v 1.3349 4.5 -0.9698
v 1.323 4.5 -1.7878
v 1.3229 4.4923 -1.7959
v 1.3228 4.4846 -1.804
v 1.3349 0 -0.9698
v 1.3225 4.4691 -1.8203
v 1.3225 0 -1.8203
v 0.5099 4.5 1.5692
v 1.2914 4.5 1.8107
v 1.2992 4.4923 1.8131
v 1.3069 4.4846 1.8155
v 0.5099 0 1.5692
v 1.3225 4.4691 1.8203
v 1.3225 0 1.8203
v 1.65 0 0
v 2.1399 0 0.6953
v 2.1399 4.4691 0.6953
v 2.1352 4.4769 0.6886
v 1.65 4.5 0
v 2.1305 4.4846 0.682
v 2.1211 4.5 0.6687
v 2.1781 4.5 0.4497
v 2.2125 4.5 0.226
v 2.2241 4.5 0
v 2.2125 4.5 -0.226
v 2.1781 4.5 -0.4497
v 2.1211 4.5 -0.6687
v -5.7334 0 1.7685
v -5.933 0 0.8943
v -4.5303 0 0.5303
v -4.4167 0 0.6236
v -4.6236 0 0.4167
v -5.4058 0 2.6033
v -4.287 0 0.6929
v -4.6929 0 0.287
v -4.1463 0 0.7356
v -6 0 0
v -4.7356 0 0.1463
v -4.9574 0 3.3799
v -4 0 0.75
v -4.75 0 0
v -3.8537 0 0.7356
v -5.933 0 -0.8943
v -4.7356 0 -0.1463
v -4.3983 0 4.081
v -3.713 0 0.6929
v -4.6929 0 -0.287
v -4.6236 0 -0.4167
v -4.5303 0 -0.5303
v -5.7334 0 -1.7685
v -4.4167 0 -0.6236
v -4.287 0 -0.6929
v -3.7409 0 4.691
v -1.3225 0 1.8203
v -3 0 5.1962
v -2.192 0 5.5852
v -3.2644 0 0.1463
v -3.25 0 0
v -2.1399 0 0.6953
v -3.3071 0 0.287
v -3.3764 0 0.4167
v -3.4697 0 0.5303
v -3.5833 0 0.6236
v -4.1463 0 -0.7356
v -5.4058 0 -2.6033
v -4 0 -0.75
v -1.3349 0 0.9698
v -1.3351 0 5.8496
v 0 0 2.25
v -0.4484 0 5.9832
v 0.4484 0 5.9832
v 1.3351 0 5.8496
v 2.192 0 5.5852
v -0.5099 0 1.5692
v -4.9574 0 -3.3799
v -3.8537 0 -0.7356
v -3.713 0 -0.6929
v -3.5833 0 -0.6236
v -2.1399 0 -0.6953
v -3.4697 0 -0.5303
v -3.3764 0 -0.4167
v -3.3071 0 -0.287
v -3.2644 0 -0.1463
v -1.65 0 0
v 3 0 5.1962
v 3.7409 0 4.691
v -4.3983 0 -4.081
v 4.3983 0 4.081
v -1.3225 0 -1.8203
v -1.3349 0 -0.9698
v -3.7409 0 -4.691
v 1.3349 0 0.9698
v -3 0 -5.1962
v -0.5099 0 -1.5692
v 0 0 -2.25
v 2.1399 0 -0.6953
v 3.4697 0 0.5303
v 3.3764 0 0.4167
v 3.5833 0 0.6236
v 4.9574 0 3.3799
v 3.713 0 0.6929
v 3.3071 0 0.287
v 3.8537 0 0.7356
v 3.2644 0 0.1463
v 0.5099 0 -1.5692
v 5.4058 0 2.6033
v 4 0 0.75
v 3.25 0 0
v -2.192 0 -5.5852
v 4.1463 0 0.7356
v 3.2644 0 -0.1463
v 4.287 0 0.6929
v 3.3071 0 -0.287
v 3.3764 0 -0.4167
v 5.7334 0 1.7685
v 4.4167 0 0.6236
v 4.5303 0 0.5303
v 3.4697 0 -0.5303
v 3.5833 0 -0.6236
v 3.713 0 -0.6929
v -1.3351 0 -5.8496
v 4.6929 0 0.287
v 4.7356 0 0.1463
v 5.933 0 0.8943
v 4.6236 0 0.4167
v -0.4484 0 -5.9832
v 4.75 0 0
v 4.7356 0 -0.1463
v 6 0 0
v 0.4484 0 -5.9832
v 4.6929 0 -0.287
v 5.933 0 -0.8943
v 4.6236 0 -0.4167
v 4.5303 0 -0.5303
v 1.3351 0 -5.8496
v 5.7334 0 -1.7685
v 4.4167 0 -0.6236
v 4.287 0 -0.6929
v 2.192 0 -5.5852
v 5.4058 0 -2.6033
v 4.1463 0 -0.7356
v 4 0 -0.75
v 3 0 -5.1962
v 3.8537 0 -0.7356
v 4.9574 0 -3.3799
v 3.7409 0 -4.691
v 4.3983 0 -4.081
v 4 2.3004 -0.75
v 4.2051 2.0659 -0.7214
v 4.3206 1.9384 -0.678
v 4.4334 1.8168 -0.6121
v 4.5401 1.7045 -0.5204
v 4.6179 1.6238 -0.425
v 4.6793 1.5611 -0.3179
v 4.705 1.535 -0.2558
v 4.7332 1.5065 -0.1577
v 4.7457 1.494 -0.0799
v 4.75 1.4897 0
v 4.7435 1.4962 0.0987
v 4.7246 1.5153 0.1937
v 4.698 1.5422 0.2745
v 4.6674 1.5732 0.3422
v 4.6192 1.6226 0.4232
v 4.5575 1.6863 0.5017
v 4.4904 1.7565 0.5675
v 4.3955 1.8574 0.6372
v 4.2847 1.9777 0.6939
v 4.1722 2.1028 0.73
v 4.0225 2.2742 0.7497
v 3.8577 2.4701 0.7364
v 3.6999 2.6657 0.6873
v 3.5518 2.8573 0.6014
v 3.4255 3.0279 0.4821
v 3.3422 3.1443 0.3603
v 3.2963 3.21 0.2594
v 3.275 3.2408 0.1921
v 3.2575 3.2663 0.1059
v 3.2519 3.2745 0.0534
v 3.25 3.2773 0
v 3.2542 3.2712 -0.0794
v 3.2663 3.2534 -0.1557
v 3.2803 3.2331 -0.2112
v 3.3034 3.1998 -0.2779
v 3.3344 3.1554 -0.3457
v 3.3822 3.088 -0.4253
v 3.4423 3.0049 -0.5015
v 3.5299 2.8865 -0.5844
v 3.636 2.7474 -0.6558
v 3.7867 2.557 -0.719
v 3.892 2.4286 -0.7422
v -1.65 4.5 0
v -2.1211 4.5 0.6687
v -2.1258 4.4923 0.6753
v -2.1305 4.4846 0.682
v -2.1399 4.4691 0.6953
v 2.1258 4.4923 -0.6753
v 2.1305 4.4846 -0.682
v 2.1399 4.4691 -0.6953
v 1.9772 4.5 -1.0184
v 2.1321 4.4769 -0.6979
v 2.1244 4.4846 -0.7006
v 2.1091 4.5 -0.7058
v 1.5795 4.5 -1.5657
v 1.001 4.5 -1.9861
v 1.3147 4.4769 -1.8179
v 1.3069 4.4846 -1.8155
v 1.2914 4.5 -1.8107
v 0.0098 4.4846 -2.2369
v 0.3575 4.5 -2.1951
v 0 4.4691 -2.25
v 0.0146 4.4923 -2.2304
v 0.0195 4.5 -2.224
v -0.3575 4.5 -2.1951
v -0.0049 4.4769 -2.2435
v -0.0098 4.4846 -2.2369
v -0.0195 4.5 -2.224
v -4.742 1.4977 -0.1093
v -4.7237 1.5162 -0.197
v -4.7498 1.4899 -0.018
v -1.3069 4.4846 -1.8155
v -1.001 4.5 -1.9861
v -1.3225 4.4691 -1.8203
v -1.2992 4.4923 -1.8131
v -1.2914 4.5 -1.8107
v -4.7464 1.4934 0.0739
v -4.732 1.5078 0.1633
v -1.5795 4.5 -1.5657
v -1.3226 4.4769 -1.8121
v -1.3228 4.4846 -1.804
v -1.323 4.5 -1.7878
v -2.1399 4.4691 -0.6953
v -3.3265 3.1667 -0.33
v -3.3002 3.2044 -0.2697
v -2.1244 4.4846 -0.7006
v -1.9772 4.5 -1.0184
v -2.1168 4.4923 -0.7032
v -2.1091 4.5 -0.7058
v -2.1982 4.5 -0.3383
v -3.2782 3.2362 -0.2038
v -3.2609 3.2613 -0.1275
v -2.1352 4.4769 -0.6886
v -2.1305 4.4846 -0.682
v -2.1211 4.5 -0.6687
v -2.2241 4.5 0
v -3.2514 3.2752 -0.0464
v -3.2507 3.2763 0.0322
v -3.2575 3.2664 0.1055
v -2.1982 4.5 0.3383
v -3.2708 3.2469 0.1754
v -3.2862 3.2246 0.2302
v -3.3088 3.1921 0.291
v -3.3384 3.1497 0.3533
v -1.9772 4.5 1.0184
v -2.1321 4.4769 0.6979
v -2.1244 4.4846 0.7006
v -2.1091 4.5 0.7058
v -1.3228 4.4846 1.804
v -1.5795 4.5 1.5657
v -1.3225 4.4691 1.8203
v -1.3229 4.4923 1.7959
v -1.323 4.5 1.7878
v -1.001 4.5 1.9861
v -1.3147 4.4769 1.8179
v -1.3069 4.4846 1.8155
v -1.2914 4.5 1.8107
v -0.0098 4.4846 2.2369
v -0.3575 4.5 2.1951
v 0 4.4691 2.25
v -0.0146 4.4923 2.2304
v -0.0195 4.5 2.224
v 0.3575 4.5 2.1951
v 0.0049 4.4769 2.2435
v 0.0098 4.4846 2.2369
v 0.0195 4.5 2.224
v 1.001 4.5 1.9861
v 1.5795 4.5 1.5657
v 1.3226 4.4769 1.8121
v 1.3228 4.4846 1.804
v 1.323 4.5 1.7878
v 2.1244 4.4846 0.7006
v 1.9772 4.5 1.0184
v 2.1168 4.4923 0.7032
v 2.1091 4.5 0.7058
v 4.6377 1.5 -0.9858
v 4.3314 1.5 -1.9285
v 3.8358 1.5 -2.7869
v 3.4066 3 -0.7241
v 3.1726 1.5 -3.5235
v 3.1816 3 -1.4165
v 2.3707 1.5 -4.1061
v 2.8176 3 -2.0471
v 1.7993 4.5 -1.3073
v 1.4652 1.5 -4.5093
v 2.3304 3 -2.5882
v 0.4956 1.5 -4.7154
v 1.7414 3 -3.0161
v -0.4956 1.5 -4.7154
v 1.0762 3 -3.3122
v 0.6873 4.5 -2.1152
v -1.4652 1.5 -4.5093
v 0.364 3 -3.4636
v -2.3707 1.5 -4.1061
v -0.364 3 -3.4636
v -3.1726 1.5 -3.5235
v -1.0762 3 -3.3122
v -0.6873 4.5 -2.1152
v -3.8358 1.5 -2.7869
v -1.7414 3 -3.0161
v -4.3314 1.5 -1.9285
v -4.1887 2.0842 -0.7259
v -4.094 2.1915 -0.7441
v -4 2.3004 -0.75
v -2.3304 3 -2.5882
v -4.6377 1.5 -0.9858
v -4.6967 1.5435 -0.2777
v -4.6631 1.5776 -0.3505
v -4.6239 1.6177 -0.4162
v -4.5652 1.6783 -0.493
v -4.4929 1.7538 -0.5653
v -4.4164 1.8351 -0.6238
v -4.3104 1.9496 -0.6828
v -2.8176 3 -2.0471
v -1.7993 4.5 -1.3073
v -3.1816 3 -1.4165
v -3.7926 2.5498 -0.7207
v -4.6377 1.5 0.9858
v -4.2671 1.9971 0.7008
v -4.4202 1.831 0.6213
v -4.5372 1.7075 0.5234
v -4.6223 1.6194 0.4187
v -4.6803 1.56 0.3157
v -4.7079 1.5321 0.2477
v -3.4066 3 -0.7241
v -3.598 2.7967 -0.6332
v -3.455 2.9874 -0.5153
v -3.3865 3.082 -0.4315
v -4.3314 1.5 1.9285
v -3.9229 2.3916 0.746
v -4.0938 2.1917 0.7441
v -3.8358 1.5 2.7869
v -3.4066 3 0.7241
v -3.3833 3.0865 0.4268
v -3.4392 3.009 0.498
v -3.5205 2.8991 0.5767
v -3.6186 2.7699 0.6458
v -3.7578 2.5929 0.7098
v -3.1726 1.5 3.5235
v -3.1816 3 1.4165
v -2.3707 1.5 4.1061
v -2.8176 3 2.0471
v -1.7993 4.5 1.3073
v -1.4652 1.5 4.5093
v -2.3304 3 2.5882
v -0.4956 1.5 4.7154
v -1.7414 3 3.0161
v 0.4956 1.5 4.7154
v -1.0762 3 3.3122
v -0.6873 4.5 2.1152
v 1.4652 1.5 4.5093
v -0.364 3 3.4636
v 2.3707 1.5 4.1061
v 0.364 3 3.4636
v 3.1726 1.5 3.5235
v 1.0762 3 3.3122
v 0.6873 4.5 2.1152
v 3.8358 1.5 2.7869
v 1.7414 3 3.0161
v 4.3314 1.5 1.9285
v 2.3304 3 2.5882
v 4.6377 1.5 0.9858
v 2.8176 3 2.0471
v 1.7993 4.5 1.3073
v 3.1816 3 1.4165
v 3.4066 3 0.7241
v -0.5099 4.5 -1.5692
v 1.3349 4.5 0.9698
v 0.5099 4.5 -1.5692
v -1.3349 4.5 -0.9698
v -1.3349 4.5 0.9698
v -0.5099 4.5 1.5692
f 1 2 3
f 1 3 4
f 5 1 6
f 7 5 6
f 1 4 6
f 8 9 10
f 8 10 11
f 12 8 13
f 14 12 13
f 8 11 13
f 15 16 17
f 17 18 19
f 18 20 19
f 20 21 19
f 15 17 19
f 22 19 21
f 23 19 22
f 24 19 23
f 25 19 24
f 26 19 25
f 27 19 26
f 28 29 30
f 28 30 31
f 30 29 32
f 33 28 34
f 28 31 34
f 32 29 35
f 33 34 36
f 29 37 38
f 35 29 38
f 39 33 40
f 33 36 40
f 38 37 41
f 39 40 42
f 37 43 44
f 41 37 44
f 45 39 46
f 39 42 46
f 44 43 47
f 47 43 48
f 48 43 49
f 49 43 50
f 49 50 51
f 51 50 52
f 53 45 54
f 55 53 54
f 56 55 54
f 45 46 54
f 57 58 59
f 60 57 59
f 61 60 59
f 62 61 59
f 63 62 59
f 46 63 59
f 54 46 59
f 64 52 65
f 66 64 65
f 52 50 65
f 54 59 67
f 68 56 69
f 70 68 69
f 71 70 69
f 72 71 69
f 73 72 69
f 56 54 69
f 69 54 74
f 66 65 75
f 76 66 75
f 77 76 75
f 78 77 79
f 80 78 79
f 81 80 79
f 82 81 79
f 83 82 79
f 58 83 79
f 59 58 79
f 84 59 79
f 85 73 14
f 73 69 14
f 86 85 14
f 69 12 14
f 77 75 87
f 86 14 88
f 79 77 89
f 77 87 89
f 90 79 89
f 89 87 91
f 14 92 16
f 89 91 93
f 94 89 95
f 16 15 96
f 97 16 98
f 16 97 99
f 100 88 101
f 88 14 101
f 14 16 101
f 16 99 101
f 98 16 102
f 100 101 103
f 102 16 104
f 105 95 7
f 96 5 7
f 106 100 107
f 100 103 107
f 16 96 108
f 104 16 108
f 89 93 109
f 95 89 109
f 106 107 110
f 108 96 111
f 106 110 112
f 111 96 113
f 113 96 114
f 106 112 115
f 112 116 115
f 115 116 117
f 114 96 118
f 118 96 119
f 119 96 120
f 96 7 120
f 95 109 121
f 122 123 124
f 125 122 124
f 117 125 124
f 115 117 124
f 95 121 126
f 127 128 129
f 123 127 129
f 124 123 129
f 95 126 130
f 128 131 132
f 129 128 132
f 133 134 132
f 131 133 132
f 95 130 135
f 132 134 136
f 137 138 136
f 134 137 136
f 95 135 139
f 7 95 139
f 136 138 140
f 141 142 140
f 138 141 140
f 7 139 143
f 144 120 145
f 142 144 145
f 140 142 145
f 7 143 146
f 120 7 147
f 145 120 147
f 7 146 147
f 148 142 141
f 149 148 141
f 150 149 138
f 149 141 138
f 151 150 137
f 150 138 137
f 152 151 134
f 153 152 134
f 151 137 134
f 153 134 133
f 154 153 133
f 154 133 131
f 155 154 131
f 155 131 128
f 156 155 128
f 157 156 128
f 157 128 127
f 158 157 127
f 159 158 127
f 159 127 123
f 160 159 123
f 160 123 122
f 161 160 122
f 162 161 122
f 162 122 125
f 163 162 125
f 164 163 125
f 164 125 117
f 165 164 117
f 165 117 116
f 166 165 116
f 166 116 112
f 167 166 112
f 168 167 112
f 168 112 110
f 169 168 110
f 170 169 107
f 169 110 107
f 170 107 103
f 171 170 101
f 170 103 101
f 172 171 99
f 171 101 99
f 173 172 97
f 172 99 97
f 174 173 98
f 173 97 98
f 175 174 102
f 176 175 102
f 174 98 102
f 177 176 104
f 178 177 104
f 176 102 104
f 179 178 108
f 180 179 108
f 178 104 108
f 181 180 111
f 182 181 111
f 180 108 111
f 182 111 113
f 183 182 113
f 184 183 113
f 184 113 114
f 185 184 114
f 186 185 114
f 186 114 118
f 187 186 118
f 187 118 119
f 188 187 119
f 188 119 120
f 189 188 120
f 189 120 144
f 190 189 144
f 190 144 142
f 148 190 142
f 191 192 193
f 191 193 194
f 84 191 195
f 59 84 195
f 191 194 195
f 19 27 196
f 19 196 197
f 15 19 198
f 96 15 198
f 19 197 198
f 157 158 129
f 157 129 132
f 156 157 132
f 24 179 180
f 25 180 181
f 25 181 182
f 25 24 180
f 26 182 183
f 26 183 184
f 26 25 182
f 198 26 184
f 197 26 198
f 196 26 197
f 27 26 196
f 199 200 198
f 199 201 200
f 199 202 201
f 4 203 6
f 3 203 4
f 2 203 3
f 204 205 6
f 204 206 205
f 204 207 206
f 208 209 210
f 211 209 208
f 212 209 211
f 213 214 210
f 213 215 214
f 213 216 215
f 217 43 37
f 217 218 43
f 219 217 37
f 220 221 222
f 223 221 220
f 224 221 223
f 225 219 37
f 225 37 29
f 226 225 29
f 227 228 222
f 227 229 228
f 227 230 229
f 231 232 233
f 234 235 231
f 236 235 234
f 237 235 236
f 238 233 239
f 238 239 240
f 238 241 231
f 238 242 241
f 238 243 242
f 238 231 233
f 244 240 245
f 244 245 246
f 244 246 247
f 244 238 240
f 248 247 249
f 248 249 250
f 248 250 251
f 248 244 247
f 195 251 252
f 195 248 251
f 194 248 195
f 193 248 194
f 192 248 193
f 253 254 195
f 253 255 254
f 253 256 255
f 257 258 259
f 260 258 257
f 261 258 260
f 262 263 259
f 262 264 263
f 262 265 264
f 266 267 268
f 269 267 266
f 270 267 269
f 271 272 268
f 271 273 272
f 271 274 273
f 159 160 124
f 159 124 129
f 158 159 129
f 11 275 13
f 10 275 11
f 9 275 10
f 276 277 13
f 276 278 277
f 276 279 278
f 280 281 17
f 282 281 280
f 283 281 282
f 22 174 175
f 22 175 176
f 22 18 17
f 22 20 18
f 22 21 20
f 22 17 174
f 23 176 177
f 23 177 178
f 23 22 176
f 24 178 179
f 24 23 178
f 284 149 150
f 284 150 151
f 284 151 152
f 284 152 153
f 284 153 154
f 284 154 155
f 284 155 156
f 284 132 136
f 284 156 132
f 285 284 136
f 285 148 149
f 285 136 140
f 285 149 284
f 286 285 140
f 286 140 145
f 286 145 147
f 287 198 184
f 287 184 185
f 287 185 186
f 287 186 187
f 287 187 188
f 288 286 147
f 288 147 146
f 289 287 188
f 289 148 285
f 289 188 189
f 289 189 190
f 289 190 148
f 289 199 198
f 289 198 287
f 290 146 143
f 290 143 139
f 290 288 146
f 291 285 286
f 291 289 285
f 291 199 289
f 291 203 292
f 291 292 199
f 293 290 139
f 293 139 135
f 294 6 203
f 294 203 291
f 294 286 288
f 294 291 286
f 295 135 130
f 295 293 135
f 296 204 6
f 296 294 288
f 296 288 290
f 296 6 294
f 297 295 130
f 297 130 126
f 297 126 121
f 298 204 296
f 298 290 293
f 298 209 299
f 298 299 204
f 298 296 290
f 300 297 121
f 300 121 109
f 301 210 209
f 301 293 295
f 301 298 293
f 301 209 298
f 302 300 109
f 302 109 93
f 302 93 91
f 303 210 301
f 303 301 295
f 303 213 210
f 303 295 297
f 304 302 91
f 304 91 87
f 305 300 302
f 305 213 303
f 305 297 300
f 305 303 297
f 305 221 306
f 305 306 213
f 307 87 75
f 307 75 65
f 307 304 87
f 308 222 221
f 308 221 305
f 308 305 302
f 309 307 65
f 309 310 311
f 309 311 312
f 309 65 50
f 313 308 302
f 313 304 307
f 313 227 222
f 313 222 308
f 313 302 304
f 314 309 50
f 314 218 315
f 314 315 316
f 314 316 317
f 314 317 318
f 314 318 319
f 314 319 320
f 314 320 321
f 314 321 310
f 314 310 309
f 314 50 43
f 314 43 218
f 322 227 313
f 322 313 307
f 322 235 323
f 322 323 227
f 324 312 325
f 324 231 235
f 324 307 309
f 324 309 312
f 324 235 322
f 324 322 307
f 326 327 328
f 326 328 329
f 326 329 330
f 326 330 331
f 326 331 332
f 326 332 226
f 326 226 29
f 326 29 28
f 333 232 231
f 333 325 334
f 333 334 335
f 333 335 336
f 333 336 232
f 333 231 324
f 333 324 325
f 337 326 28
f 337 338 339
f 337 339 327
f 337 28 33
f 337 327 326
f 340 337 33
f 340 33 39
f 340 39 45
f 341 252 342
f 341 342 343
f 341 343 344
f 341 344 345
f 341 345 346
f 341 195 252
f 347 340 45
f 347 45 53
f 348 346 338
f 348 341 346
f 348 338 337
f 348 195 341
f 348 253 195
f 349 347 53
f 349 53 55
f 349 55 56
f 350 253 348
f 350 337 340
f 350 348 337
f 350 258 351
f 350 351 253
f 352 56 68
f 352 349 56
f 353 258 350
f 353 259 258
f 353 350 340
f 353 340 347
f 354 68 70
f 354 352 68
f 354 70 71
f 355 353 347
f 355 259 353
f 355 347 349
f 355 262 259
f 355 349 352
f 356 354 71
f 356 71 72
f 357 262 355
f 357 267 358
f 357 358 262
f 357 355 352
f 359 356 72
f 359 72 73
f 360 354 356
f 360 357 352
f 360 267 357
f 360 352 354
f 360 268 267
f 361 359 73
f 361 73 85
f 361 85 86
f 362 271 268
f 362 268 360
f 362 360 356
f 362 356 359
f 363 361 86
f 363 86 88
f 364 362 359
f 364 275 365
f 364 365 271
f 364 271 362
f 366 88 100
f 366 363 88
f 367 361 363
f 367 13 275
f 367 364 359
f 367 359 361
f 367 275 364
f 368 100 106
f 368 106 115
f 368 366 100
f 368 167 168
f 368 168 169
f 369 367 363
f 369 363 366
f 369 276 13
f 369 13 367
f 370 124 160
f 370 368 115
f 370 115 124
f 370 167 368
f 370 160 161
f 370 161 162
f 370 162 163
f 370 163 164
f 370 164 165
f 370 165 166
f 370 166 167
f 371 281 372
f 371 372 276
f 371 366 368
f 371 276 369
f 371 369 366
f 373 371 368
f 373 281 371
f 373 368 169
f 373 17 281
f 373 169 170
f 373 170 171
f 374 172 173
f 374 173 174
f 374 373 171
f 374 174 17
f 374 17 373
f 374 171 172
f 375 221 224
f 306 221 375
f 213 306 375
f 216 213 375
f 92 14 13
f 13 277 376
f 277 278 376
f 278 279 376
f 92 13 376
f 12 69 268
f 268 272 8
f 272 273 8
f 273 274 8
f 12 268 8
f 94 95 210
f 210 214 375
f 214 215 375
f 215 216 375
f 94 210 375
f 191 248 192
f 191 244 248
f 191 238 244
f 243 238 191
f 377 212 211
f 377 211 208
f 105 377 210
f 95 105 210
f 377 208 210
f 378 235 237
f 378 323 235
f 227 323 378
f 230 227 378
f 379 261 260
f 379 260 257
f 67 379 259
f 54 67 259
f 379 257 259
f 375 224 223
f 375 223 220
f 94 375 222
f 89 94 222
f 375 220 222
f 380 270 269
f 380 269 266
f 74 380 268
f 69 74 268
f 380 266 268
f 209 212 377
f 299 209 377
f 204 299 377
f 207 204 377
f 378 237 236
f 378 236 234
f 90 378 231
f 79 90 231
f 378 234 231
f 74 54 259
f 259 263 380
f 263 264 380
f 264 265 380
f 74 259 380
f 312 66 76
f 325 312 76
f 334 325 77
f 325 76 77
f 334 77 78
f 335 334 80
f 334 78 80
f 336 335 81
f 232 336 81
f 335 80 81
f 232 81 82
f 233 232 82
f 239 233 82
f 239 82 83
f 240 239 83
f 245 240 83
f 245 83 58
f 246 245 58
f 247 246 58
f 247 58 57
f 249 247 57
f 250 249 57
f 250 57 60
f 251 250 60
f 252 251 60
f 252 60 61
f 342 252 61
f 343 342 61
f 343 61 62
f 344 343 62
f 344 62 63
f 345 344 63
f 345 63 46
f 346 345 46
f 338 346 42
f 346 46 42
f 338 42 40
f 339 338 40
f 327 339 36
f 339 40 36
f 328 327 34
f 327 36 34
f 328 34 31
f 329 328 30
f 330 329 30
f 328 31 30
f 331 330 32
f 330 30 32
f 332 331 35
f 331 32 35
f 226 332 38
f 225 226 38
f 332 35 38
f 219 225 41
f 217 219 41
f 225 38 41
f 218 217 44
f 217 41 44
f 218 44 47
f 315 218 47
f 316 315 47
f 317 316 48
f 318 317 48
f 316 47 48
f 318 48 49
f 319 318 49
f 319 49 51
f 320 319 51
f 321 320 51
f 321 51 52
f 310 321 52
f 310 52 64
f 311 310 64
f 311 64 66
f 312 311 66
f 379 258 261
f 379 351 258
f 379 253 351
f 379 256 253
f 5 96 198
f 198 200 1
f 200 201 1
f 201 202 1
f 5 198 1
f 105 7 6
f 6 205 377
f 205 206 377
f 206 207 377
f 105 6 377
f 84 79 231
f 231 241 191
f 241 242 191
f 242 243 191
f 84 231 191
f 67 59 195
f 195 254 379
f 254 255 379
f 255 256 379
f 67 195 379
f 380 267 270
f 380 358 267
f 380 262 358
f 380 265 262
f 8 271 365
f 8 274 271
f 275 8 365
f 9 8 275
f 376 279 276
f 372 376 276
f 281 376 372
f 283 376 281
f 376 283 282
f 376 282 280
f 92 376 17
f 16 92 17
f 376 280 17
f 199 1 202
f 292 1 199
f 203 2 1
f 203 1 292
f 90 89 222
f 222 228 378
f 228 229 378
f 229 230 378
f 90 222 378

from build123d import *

# Parameters (mm, degrees)
SKETCH1_R           = 6
BOSS_EXTRUDE1_DEPTH = 4.5
BOSS_EXTRUDE1_TAPER = 40
CUT_EXTRUDE1_DEPTH  = 5
SKETCH5_R           = 0.75
CUT_EXTRUDE2_DEPTH  = 5


with BuildPart() as part:
    # Sketch1 → Boss-Extrude1 (new body)
    with BuildSketch(Plane(origin=(0, 0, 0), x_dir=(1, 0, 0), z_dir=(0, 1, 0))):
        Circle(SKETCH1_R)
    extrude(amount=BOSS_EXTRUDE1_DEPTH, taper=BOSS_EXTRUDE1_TAPER)

    # Sketch3 → Cut-Extrude1 (cut)
    with BuildSketch(Plane(origin=(0, 4.5, 0), x_dir=(1, 0, 0), z_dir=(0, 1, 0))):
        Polygon((0, 2.25), (-0.509878041, 1.569243252), (-1.322516818, 1.820288237), (-1.334878041, 0.969845666), (-2.139877162, 0.695288237), (-1.65, 0), (-2.139877162, -0.695288237), (-1.334878041, -0.969845666), (-1.322516818, -1.820288237), (-0.509878041, -1.569243252), (0, -2.25), (0.509878041, -1.569243252), (1.322516818, -1.820288237), (1.334878041, -0.969845666), (2.139877162, -0.695288237), (1.65, 0), (2.139877162, 0.695288237), (1.334878041, 0.969845666), (1.322516818, 1.820288237), (0.509878041, 1.569243252), align=None)
    extrude(amount=-CUT_EXTRUDE1_DEPTH, mode=Mode.SUBTRACT)

    # Sketch5 → Cut-Extrude2 (cut)
    with BuildSketch(Plane.XZ):
        with Locations(Location((4, 0, 0), (0, 0, 270))):
            Circle(SKETCH5_R)
        with Locations(Location((-4, 0, 0), (0, 0, 270))):
            Circle(SKETCH5_R)
    extrude(amount=-CUT_EXTRUDE2_DEPTH, mode=Mode.SUBTRACT)


solid = part.part
